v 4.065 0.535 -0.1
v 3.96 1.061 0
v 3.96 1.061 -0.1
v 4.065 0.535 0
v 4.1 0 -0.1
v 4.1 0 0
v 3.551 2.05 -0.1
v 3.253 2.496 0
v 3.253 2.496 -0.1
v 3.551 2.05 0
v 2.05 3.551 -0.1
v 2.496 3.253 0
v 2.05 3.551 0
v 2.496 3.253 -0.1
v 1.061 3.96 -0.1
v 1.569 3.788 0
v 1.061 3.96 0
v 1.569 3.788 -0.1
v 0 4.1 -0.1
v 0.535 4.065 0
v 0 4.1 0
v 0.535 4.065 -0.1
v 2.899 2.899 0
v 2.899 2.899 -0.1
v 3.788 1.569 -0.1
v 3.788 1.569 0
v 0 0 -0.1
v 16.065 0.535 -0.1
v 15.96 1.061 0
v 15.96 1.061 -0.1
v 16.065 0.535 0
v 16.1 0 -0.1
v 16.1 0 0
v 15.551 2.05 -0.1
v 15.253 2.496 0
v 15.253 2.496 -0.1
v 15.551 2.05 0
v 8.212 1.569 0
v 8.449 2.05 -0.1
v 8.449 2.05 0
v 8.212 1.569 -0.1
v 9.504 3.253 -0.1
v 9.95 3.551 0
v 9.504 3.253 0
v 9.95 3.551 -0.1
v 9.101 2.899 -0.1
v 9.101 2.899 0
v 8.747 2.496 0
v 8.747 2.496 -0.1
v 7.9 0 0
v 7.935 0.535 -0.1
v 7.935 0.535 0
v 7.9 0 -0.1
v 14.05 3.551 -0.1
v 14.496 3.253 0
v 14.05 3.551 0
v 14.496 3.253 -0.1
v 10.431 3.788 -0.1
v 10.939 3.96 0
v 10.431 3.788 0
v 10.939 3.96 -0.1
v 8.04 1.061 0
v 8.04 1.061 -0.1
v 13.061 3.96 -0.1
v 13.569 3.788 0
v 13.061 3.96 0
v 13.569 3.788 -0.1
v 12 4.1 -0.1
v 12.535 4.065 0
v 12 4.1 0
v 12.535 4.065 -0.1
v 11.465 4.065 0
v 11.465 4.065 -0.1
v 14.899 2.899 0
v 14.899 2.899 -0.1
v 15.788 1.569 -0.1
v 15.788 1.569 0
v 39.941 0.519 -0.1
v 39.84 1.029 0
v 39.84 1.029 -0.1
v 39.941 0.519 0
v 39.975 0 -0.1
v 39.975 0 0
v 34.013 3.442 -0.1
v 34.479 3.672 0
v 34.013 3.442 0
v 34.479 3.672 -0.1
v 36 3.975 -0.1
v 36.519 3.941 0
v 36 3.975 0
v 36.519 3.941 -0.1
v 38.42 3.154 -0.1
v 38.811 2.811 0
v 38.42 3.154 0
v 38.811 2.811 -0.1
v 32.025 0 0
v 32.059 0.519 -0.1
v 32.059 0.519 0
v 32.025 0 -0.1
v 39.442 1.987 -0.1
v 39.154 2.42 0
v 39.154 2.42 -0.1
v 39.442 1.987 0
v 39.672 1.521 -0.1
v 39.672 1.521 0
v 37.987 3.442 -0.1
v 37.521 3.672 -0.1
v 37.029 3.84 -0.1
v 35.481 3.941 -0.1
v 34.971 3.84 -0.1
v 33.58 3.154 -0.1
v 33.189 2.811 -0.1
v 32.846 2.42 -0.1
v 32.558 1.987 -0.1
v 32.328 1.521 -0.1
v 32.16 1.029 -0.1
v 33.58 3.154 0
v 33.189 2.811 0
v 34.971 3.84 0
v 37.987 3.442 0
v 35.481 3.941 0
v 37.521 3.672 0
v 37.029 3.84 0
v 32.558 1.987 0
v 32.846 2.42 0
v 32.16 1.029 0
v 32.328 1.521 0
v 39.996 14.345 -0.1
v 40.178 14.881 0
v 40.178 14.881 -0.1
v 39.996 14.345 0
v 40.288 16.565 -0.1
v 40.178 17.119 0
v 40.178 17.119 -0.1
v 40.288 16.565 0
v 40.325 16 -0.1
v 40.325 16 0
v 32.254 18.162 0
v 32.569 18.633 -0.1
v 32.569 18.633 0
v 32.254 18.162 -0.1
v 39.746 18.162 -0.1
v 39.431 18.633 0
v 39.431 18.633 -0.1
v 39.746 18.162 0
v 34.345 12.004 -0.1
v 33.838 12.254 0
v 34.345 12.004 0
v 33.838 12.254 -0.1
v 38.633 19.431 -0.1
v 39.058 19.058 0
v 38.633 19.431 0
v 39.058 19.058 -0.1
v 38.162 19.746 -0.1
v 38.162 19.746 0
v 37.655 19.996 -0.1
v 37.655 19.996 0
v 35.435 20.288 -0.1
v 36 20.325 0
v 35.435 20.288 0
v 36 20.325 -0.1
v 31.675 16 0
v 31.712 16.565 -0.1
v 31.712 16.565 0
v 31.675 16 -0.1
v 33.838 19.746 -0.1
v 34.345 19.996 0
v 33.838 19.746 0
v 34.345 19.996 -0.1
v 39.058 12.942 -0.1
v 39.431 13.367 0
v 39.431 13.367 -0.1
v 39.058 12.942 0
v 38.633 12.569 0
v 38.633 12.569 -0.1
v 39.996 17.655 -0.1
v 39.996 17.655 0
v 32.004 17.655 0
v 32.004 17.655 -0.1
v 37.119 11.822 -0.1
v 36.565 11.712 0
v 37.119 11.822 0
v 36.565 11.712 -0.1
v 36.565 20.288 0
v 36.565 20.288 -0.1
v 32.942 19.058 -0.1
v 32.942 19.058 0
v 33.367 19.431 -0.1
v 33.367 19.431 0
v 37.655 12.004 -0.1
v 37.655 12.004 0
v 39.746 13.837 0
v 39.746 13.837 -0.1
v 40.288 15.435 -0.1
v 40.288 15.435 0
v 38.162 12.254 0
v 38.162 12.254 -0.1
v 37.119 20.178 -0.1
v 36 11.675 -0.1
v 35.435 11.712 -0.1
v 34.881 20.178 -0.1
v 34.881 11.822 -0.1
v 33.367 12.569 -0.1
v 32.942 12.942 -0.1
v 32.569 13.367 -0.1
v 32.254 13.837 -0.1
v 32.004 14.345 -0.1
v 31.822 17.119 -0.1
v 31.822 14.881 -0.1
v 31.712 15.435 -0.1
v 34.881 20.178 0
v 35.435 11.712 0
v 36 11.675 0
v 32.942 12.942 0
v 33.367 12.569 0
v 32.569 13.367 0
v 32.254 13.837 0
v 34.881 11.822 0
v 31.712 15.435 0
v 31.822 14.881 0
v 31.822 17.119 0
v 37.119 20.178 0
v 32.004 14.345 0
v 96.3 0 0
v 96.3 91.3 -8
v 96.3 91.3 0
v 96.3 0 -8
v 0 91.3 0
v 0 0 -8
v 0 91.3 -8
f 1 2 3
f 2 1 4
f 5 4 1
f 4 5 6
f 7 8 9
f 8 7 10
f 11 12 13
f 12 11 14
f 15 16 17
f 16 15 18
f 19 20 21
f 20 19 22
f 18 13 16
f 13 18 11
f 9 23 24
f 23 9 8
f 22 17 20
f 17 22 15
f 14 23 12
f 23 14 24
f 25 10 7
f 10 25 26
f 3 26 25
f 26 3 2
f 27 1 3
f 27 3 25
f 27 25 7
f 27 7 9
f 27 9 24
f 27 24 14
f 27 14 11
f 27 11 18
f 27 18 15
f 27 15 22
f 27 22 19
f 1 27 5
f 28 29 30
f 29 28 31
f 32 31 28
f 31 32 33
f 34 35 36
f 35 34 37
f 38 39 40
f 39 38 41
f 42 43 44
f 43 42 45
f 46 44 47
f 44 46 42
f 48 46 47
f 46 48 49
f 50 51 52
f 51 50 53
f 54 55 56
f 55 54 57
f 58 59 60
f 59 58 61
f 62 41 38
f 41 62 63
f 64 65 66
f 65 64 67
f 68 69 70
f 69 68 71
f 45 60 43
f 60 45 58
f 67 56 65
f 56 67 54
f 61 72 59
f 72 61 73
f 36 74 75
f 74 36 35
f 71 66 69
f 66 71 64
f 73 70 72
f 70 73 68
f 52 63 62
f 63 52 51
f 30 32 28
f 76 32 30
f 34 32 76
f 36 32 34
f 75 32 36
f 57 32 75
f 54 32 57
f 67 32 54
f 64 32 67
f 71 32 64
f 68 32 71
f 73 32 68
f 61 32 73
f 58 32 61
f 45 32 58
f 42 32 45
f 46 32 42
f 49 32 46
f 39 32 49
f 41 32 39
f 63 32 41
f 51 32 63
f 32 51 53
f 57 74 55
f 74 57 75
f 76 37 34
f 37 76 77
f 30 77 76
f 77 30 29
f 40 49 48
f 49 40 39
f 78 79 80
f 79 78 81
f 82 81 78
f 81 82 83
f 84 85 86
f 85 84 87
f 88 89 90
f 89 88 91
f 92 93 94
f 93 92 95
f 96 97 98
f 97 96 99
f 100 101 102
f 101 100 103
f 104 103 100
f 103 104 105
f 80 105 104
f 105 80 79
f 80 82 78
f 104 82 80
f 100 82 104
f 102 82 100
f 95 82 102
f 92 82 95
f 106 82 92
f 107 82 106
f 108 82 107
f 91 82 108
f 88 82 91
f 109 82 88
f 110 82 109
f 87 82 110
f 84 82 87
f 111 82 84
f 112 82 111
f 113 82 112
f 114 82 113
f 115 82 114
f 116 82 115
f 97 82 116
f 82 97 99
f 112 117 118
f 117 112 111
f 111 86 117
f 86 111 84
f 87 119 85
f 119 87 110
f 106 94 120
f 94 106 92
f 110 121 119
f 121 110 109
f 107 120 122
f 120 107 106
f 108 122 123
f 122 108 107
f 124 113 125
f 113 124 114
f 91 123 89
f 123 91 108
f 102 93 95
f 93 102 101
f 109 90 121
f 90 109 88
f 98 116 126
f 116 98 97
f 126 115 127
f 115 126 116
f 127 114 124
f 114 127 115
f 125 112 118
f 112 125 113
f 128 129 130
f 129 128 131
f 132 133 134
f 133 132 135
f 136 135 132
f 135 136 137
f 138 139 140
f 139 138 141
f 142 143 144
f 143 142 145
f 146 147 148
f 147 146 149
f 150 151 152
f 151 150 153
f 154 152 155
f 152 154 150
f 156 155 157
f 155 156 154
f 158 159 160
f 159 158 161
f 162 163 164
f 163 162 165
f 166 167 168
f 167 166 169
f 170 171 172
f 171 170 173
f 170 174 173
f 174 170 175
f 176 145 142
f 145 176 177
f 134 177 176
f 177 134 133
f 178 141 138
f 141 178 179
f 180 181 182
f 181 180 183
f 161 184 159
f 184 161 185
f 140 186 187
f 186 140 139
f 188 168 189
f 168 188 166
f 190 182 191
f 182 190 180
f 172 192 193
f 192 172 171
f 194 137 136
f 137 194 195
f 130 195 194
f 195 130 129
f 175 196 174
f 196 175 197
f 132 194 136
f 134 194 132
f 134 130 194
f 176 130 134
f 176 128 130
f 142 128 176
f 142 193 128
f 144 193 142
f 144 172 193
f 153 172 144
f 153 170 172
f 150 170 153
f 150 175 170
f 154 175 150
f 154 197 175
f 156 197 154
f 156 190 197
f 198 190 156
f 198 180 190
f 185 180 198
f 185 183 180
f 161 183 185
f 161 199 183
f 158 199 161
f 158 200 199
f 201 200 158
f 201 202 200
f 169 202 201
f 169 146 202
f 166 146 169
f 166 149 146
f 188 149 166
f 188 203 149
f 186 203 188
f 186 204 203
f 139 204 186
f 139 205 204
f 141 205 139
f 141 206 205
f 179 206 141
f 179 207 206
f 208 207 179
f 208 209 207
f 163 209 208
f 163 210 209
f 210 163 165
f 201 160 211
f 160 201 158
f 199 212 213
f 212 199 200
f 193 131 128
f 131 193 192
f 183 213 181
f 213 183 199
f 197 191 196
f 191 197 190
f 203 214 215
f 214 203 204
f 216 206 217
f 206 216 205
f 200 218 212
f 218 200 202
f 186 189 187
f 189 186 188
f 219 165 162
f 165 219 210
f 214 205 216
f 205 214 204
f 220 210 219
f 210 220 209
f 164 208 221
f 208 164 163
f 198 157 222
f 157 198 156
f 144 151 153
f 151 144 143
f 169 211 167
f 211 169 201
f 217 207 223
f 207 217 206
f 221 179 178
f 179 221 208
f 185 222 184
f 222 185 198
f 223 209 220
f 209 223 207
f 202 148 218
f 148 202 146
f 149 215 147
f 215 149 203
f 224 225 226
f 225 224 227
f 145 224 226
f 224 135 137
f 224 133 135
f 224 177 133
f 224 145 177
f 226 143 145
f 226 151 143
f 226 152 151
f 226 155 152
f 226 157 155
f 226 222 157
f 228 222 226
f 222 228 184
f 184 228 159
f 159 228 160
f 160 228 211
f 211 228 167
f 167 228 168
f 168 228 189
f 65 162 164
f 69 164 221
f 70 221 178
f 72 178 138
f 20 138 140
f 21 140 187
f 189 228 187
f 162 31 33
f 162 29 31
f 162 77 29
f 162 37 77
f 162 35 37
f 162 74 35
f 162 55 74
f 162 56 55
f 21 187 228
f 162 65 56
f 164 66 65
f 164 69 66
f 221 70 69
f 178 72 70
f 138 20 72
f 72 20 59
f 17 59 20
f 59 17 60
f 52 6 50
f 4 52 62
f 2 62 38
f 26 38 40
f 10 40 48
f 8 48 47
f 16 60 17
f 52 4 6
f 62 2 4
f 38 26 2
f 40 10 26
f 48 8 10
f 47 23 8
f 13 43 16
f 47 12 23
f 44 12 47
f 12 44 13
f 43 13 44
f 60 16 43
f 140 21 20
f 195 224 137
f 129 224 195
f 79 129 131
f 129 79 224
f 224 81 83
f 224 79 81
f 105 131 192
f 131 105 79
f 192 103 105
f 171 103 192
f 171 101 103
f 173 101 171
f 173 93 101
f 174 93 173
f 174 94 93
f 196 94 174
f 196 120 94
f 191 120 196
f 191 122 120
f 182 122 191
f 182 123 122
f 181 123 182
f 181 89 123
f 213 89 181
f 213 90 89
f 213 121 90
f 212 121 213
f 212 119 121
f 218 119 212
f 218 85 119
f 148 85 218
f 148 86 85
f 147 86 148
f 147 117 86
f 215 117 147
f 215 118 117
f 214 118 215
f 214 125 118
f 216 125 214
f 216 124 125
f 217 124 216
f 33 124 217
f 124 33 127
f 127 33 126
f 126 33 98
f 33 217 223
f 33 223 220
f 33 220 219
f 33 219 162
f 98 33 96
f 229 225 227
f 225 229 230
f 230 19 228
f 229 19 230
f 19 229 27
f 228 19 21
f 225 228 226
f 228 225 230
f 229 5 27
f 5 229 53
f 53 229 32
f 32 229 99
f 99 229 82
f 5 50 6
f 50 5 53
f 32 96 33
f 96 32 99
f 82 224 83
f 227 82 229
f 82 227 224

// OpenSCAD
// Dock Water Pump GAUGE (Jig 20A)
// ===========================================================================
// Fit-check for the BOM "Water pumps — Diaphragm 24V self-priming" (Dock
// table, 3 qty) class draft in dock-water-pump-24v/dock-water-pump-24v.scad.
// One plate, three checks:
//   A — HEAD-DISC bore template: a through-bore sized to the pump head OD.
//       The head (+Z face that carries the barbs) must drop through freely.
//       Verifies head_od — the structural dim that gates any pod/cradle.
//   B — BARB PAIR-PITCH template: two bores spaced port_pitch apart that BOTH
//       barb tips must drop into simultaneously. Verifies port_pitch + port_od
//       together — THE critical dim for a printed pump manifold / cradle.
//   C — BARB-OD go/no-go bores (Ø6 / Ø7.8 / Ø8.5 nominal): drop the barb tip
//       into each hole; the largest one it falls through identifies the barb
//       OD class for tubing selection. Add holes for any other OD you find.
//
// Keep these values in sync with dock-water-pump-24v.scad (provenance lives
// there + MEASURE-ME.md §21). Tune the clearances, never the part.
//
// Pass/fail + fail->fix mapping: PRINT-TEST.md Jig 20.
// License: CC BY-SA 4.0

$fn = 48;

/* [Pump params — mirror dock-water-pump-24v.scad] */
head_od    = 27.0;  // p370: (listing B0DMFKYQQG); p385: (Vendor est, set 40)
port_od    = 7.8;   // p370: (listing); p385: (RoboticsDNA 8.5, set it)
port_pitch = 12.0;  // (estimate) CRITICAL- verify against the real unit

/* [Jig dimensions - EDIT] */
head_clearance = 0.3;  // mm DIAMETRAL - head bore = head_od + this
barb_clearance = 0.4;  // mm DIAMETRAL - pair bores = port_od + this
notch_noms       = [6.0, 7.8, 8.5]; // mm candidate barb ODs (add/remove as found)
notch_clearance  = 0.15;            // mm DIAMETRAL (go = nominal + this)

plate_t      = 8.0;   // mm base thickness (all pass-through bores)
plate_margin = 8.0;   // mm margin around features

head_bore_d  = head_od + head_clearance;
barb_bore_d  = port_od + barb_clearance;
notch_ds     = [for (n = notch_noms) n + notch_clearance];

// ===== GEOMETRY (origin = plate center xy, plate top at z = 0) =====
// Features left->right: head bore, barb-pair, go/no-go row.
head_x  = -22;
barbp_x = 6;
notch_x = 36;

plate_w = (notch_x - head_x) + max(notch_ds) + max(head_bore_d, barb_bore_d) / 2 + 2 * plate_margin;
plate_h = max(head_bore_d, barb_bore_d + port_pitch) + len(notch_ds) * 16 + 2 * plate_margin;

module head_bore() {
    translate([head_x, 0, -0.1])
        cylinder(h = plate_t + 0.2, r = head_bore_d / 2);
}

module barb_pair() {
    for (x = [-1, 1]) {
        translate([barbp_x + x * port_pitch / 2, 0, -0.1])
            cylinder(h = plate_t + 0.2, r = barb_bore_d / 2);
    }
}

module notch_row() {
    for (i = [0:len(notch_ds)-1]) {
        y_off = (i - (len(notch_ds) - 1) / 2) * 16;
        translate([notch_x, y_off, -0.1])
            cylinder(h = plate_t + 0.2, r = notch_ds[i] / 2);
    }
}

module jig_plate() {
    // Plate top face at z=0, thickness below (matches house jig convention)
    translate([0, 0, -plate_t])
        cube([plate_w, plate_h, plate_t]);
}

difference() {
    jig_plate();
    head_bore();
    barb_pair();
    notch_row();
}
